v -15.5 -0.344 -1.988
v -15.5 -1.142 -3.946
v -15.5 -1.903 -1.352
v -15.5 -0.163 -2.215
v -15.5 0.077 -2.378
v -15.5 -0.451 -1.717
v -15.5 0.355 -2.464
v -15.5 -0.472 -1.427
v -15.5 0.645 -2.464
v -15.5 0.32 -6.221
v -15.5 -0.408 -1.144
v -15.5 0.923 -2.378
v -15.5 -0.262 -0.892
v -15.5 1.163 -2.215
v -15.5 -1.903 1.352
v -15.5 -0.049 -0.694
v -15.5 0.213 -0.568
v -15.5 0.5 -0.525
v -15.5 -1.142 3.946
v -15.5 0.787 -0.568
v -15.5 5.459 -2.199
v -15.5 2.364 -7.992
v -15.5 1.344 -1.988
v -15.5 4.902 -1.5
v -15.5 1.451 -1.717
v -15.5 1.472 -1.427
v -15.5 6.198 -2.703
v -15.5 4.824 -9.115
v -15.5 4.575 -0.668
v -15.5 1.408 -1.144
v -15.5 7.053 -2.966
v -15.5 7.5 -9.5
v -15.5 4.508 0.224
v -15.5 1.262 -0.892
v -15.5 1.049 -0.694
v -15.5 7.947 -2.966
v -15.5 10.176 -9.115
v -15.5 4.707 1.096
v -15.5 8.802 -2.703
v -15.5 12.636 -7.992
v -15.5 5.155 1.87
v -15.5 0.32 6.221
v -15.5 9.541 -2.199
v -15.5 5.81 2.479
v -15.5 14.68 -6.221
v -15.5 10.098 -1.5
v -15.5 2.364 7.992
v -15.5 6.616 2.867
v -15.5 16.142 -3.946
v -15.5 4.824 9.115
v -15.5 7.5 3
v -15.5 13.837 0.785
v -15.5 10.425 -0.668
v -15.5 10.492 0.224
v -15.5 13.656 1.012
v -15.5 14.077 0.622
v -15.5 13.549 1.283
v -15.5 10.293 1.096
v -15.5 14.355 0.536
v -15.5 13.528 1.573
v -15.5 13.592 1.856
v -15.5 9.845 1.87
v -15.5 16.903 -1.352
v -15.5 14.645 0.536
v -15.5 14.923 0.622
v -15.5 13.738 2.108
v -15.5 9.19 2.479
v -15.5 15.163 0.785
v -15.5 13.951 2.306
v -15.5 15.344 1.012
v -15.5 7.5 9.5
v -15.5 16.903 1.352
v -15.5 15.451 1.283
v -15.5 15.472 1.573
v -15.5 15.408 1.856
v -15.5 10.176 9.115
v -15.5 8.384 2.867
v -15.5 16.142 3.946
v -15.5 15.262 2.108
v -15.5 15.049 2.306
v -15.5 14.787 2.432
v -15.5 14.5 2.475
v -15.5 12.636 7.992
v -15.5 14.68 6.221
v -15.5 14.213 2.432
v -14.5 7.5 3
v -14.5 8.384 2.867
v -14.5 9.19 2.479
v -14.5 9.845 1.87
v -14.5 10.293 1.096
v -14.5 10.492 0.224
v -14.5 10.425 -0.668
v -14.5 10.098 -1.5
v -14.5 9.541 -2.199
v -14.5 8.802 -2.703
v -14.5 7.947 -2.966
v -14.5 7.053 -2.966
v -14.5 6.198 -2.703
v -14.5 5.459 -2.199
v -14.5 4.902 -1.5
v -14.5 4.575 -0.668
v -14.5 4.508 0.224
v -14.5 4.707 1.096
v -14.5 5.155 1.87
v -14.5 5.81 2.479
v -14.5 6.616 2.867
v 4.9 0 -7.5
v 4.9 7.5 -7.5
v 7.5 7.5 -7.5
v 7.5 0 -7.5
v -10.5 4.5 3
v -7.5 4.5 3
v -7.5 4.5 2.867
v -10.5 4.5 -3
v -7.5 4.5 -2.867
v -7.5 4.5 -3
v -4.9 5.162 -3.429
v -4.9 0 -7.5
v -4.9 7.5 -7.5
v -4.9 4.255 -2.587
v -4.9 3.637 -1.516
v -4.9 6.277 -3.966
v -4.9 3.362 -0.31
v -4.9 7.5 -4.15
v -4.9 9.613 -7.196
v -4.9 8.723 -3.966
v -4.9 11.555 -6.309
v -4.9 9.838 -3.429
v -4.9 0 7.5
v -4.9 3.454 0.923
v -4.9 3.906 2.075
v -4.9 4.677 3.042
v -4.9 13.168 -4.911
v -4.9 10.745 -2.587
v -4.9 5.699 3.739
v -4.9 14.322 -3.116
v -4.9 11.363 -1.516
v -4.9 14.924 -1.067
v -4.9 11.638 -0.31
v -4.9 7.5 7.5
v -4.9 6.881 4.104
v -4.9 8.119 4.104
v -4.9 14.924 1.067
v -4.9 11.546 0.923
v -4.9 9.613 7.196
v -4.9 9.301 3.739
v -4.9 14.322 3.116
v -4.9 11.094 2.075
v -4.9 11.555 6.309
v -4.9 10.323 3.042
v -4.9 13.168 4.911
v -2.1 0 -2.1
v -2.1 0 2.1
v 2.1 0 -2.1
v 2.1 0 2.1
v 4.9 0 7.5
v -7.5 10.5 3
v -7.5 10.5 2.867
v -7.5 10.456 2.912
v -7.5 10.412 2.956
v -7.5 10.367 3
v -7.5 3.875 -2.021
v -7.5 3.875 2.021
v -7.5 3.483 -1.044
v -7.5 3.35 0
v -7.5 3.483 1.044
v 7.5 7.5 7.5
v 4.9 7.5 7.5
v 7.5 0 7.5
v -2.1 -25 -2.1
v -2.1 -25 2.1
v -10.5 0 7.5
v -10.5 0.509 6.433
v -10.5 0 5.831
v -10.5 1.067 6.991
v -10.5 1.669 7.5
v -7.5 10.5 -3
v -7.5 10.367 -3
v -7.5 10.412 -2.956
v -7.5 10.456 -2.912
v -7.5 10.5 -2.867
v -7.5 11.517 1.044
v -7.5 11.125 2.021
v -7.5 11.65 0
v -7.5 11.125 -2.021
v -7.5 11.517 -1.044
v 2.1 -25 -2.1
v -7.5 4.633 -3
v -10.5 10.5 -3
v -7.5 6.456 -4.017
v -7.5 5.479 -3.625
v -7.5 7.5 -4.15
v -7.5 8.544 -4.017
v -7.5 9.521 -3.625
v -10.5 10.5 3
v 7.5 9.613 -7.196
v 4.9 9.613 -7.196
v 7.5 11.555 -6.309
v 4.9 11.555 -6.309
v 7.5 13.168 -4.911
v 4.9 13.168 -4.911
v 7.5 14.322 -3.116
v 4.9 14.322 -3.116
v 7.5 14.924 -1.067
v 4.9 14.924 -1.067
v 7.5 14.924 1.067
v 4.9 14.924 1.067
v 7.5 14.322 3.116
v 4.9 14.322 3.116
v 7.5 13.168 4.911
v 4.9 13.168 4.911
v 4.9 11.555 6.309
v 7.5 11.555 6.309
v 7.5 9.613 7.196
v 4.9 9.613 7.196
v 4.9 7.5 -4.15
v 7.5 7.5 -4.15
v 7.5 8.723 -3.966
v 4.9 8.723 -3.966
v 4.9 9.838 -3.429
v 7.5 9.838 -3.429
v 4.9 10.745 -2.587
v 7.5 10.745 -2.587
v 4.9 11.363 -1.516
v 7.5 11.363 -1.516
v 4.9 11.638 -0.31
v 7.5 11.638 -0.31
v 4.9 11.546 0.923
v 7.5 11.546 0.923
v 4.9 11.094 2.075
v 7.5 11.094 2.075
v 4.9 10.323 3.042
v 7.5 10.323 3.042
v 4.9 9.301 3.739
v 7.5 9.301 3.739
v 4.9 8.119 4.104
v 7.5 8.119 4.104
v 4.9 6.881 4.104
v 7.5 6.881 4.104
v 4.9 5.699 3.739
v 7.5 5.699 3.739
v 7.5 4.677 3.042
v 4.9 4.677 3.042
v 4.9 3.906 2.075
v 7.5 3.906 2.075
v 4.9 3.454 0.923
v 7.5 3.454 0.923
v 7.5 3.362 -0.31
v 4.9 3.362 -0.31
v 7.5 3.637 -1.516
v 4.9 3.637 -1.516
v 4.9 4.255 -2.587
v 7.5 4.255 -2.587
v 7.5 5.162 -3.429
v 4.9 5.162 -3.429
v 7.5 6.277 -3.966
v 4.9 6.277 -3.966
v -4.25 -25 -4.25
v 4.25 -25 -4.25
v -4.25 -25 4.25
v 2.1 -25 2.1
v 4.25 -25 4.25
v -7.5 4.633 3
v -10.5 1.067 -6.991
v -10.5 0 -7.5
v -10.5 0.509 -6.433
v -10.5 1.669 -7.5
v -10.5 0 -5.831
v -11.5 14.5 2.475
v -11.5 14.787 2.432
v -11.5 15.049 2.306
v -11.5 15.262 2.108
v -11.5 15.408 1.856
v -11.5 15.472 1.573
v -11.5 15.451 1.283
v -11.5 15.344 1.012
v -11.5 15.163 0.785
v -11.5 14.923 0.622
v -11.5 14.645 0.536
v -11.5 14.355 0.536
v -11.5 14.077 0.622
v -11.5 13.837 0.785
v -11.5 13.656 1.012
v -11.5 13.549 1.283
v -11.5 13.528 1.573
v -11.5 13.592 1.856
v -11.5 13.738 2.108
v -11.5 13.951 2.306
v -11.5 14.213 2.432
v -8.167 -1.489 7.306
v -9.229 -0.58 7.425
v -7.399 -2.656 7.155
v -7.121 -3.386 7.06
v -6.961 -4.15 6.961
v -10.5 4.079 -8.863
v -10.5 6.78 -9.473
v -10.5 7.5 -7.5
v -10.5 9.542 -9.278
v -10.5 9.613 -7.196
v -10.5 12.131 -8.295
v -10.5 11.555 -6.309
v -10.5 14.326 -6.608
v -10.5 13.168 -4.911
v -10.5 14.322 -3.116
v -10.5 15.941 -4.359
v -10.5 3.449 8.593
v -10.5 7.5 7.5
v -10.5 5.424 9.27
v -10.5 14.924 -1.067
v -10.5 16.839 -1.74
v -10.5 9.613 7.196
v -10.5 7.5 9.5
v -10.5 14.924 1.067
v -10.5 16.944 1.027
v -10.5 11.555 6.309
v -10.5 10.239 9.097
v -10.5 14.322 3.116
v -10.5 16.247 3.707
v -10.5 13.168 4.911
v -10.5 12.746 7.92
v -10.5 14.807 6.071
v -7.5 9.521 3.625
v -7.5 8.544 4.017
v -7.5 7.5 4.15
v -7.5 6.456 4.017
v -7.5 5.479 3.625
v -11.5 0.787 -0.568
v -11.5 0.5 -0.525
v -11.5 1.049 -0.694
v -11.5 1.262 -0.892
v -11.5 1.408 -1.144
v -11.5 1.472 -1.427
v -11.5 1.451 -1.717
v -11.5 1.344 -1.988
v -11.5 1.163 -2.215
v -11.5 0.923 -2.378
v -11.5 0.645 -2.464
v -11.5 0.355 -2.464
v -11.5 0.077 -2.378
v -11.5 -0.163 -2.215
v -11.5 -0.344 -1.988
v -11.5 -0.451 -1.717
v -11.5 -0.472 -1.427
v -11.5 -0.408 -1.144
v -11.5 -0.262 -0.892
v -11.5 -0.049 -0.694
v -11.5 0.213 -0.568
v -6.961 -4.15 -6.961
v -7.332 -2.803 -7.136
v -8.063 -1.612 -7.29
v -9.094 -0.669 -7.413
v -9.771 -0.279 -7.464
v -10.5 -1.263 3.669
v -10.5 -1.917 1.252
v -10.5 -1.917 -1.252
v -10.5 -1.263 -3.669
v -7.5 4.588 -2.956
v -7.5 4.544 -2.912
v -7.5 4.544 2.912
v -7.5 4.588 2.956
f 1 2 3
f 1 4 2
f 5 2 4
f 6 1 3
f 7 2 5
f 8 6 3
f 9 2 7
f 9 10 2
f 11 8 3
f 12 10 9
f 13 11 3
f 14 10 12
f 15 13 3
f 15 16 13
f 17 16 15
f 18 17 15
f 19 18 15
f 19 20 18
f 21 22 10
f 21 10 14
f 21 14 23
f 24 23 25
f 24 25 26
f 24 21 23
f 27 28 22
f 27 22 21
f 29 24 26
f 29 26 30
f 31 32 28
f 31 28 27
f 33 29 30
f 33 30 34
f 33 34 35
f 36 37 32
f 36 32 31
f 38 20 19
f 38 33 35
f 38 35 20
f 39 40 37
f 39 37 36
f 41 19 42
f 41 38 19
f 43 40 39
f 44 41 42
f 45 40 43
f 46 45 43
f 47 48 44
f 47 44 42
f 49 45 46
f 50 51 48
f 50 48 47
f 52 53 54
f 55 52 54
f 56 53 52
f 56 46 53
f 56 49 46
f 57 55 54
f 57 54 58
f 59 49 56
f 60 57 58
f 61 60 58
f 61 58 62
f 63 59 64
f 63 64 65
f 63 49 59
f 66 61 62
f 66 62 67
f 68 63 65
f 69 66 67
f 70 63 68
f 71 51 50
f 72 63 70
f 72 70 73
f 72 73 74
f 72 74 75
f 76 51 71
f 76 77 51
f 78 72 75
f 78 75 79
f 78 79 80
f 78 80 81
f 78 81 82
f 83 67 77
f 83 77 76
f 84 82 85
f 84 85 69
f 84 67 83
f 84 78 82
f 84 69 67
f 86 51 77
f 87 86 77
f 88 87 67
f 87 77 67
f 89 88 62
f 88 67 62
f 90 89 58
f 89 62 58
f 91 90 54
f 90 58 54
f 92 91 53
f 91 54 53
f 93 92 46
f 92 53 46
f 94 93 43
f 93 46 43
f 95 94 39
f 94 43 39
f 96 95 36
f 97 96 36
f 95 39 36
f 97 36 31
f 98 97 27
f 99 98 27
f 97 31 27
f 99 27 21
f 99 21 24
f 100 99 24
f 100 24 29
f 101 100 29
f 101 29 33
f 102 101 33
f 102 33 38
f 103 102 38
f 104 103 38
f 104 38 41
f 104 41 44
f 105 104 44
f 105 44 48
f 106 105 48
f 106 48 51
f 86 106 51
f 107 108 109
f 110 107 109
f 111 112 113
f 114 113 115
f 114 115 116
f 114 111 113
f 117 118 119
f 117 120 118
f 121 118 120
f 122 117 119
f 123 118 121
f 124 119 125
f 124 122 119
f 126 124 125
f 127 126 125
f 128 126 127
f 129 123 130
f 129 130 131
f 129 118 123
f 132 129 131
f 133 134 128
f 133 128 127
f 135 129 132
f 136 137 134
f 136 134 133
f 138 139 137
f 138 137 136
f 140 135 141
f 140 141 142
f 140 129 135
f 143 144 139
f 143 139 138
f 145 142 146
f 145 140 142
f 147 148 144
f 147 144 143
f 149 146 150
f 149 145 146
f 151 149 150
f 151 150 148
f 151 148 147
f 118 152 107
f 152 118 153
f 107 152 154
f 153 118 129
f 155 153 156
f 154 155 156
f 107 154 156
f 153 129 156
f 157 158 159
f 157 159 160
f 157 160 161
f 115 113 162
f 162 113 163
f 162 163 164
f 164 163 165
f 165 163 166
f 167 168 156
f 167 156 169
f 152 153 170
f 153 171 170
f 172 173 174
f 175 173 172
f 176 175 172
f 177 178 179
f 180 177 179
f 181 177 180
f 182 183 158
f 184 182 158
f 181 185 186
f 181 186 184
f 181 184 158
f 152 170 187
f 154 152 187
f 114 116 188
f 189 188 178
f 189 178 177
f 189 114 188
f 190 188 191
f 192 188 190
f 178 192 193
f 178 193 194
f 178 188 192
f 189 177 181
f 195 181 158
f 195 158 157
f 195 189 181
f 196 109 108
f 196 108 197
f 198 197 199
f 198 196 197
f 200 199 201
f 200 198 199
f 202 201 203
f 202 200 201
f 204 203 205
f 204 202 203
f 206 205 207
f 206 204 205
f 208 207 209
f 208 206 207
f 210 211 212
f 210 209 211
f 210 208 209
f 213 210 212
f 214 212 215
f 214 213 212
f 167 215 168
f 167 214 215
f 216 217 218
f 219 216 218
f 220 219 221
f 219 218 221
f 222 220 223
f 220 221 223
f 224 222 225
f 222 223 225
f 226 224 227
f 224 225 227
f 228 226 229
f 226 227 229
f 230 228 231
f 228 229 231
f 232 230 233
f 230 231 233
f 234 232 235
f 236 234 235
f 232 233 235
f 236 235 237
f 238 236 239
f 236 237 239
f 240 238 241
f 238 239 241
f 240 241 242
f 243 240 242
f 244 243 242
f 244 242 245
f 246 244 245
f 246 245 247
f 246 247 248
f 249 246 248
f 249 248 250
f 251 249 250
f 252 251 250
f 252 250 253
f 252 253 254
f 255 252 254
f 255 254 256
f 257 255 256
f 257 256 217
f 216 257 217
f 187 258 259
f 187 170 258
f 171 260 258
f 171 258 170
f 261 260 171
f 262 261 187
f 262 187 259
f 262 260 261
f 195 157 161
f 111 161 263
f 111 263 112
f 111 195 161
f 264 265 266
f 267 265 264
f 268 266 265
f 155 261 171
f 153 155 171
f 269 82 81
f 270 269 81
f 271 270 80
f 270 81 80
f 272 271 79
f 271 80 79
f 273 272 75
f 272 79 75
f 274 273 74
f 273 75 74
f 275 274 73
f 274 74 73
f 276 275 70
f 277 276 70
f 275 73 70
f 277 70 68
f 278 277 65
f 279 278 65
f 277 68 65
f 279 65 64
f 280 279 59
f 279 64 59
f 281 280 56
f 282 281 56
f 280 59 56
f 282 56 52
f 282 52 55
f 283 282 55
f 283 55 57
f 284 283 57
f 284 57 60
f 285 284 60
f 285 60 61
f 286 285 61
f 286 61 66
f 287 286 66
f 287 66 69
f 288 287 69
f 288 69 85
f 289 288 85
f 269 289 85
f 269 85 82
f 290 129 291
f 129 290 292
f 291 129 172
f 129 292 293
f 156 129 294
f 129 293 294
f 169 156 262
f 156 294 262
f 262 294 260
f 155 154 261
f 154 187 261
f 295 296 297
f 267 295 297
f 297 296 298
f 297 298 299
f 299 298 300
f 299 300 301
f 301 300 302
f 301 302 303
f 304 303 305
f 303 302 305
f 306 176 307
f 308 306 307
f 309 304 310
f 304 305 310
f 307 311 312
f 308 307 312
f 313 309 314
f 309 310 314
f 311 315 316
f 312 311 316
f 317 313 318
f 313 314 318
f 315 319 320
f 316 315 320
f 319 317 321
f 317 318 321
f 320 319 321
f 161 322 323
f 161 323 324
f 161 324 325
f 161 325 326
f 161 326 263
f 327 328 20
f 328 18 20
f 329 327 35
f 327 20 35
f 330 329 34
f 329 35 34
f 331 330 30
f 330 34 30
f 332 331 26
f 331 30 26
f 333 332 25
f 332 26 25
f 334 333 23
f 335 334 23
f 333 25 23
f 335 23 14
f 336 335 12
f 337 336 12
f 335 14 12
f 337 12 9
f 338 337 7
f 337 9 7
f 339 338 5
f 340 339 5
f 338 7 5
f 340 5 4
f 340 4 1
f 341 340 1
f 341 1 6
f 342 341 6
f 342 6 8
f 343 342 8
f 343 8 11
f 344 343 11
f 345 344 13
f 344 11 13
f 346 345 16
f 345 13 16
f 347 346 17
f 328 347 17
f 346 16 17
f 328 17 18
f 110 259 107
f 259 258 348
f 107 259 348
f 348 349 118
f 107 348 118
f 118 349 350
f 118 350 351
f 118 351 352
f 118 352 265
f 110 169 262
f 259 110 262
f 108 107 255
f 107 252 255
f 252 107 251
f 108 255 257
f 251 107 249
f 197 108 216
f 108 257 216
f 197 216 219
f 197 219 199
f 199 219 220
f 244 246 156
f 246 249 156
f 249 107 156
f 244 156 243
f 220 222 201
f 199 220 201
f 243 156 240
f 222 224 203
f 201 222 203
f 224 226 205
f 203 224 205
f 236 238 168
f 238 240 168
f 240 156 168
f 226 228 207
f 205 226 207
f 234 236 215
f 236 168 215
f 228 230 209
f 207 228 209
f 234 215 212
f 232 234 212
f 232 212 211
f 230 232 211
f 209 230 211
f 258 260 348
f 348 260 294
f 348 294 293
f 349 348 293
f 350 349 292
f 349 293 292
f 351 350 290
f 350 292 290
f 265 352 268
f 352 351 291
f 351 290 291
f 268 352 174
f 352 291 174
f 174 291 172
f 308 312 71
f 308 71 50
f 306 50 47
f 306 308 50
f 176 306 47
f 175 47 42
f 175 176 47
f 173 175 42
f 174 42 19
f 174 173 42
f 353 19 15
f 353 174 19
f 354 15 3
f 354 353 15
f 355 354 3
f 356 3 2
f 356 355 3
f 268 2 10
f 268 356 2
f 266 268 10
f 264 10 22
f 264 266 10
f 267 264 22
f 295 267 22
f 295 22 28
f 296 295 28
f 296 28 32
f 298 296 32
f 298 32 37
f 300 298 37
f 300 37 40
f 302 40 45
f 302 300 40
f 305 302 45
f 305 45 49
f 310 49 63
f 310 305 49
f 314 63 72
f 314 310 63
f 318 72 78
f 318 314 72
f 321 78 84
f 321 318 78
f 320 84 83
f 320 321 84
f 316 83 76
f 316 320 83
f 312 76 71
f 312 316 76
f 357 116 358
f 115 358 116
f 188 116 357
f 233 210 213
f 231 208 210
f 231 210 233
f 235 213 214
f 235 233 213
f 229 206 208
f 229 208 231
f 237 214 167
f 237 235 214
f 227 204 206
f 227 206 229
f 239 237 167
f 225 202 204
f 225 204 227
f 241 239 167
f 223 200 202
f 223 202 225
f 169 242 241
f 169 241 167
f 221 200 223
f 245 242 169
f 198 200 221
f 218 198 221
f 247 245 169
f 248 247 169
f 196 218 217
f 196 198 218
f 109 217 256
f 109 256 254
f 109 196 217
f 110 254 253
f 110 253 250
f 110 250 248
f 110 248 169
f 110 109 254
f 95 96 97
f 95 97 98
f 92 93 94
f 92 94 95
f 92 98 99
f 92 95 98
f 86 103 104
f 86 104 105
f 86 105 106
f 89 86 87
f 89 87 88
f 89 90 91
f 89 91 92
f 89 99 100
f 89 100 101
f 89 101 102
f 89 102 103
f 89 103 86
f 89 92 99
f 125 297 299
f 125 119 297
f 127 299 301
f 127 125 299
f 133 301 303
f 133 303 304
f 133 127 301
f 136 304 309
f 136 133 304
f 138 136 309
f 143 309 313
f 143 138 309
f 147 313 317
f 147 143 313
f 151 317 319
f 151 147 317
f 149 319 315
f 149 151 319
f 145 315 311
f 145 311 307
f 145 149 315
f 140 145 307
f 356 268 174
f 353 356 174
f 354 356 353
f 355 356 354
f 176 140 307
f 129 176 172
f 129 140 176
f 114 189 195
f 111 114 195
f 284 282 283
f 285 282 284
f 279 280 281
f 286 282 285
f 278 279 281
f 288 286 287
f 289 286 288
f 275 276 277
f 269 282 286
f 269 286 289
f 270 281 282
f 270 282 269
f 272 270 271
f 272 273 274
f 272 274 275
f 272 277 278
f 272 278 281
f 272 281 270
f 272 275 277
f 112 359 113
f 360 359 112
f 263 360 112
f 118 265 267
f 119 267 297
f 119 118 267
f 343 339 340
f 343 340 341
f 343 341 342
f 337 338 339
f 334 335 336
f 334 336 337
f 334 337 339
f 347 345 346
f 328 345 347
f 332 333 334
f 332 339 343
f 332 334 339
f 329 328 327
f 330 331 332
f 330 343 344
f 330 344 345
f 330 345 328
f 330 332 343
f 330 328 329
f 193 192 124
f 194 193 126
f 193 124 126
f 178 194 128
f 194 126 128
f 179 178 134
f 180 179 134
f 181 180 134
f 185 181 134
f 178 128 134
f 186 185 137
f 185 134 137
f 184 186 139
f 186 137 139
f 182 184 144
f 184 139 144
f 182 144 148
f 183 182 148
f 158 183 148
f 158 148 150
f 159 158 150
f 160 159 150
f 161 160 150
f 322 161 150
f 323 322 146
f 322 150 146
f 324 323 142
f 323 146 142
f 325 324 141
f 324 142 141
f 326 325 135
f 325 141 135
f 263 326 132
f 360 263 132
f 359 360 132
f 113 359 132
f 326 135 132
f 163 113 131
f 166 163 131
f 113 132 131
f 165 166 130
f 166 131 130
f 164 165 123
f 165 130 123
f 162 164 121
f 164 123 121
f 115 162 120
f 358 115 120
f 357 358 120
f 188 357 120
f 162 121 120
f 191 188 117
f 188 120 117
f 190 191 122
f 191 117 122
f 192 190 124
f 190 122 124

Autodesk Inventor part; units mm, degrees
ref_plane "YZ Plane" through (0, 0, 0) normal (1, 0, 0) x (0, 1, 0)
ref_plane "XZ Plane" through (0, 0, 0) normal (0, 1, 0) x (-1, 0, 0)
ref_plane "XY Plane" through (0, 0, 0) normal (0, 0, 1) x (1, 0, 0)
sketch "Sketch1" plane through (0, 0, 0) normal (0, 0, 1) x (1, 0, 0)
  line L0 (0, 0) -> (-7.5, 0)
  line L1 (-7.5, 0) -> (-7.5, 15)
  line L2 (-7.5, 15) -> (7.5, 15)
  line L3 (7.5, 15) -> (7.5, 0)
  line L4 (7.5, 0) -> (-7.5, 0)
  dimension "d55" = 7.5
  dimension "d56" = 15
  dimension "d57" = 15
extrude "Extrusion1" add sketch "Sketch1" along normal mid plane 15
sketch "Sketch11" plane through (0, 0, 7.5) normal (0, 0, 1) x (1, 0, 0)
  line L0 (7.5, 15) -> (-7.5, 15) projected
  line L1 (0, 15) -> (0, -25)
  line L2 (0, -25) -> (4.25, -25)
  line L3 (0, -25) -> (-4.25, -25)
  line L4 (-7.5, 0) -> (7.5, 0) projected
  line L5 (-4.25, -25) -> (-7.5, 0)
  line L6 (-7.5, 0) -> (7.5, 0)
  line L7 (7.5, 0) -> (4.25, -25)
  point P0 (0, 0)
  dimension "d58" = 40
  dimension "d59" = 4.25
  dimension "d60" = 4.25
extrude "Extrusion7" add sketch "Sketch11" against normal blind 15
sketch "Sketch13" plane through (0, 0, 0) normal (1, 0, 0) x (0, 1, 0)
  line L0 (15, -7.5) -> (15, 7.5) projected
  line L1 (15, 0) -> (-25, 0)
  line L2 (-25, 7.5) -> (-25, -7.5) projected
  line L3 (-25, 0) -> (-25, 4.25)
  line L4 (-25, 7.5) -> (-25, -7.5) projected
  line L5 (-25, 4.25) -> (-25, 0)
  line L6 (-25, 0) -> (-25, -4.25)
  line L7 (0, -7.5) -> (15, -7.5) projected
  line L8 (-25, -4.25) -> (0, -7.5)
  line L9 (0, -7.5) -> (0, 7.5)
  line L10 (0, 7.5) -> (-25, 4.25)
  line L11 (-25, 4.25) -> (-25, 7.5)
  line L12 (-25, 7.5) -> (0, 7.5)
  line L13 (-25, -4.25) -> (-25, -7.5)
  line L14 (-25, -7.5) -> (0, -7.5) projected
  line L15 (-25, -7.5) -> (0, -7.5)
  point P0 (0, 0)
  dimension "d68" = 40
  dimension "d69" = 4.25
  dimension "d70" = 4.25
extrude "Extrusion8" cut sketch "Sketch13" along normal through all both and the other way through all contours L14 L2 L8 | L10 L2 L12
sketch "Sketch15" plane through (-4.25, -25, -4.25) normal (0, -1, 0) x (1, 0, 0)
  line L0 (4.25, 4.25) -> (2.15, 4.25)
  line L1 (0, 8.5) -> (0, 0) projected
  line L2 (2.15, 4.25) -> (2.15, 2.15)
  line L3 (2.15, 2.15) -> (6.35, 2.15)
  line L4 (6.35, 2.15) -> (6.35, 6.35)
  line L5 (6.35, 6.35) -> (2.15, 6.35)
  line L6 (2.15, 6.35) -> (2.15, 4.25)
  point P0 (8.5, 8.5)
  point P1 (8.5, 0)
  dimension "d112" = 2.1
  dimension "d113" = 2.1
  dimension "d114" = 4.2
  dimension "d115" = 4.2
extrude "Extrusion9" cut sketch "Sketch15" against normal through all
sketch "Sketch16" plane through (0, 0, 7.5) normal (0, 0, 1) x (1, 0, 0)
  line L0 (0, 0) -> (4.9, 0)
  line L1 (-7.5, 0) -> (7.5, 0) projected
  line L2 (4.9, 0) -> (4.9, 16.5506)
  line L3 (0, 0) -> (-4.9, 0)
  line L4 (-4.9, 0) -> (-4.9, 16.5506)
  line L5 (-4.9, 16.5506) -> (4.9, 16.5506)
  dimension "d83" = 4.9
  dimension "d84" = 4.9
extrude "Extrusion10" cut sketch "Sketch16" against normal through all
sketch "Sketch17" plane through (7.5, 15, 7.5) normal (1, 0, 0) x (0, 0, -1)
  line L0 (15, 0) -> (0, 0) projected
  line L1 (0, 0) -> (7.5, 0)
  line L2 (0, 0) -> (0, -15) projected
  line L3 (0, -7.5) -> (0, 0)
  line L4 (0, 0) -> (15, 0)
  line L5 (15, -15) -> (15, 0) projected
  line L6 (15, 0) -> (15, -7.5)
  arc A0 (15, -7.5) -> (0, -7.5) centre (7.5, -7.5) ccw
  line L7 (0, -15) -> (0, 0) projected
  line L8 (0, -7.5) -> (0, 0)
  line L9 (15, 0) -> (0, 0) projected
  line L10 (0, 0) -> (15, 0)
  line L11 (15, 0) -> (15, -7.5)
  point P0 (7.5, -15)
  dimension "d133" = 15
extrude "Extrusion11" cut sketch "Sketch17" against normal through all
sketch "Sketch18" plane through (7.5, 0, 7.5) normal (1, 0, 0) x (0, 0, -1)
  line L0 (0, 0) -> (0, 15)
  line L1 (0, 15) -> (15, 15)
  line L2 (15, 15) -> (15, 0)
  line L3 (15, 0) -> (0, 0)
  line L4 (0, 15) -> (15, 0)
  line L5 (15, 15) -> (0, 0)
  circle A0 centre (7.5, 7.5) radius 4.15
  point P0 (7.5, 0)
  dimension "d90" = 15
  dimension "d91" = 8.3
extrude "Extrusion12" cut sketch "Sketch18" against normal blind 8.3 contours A0 L4 L5 | L5 L4 A0 | A0 L5 L4 | L4 L5 A0
sketch "Sketch19" plane through (-7.5, 0, -7.5) normal (-1, 0, 0) x (0, 0, 1)
  line L0 (0, 0) -> (0, 15)
  line L1 (0, 15) -> (15, 15)
  line L2 (15, 15) -> (15, 0)
  line L3 (15, 0) -> (0, 0) projected
  line L4 (15, 0) -> (0, 0)
  point P0 (7.5, 0)
  dimension "d94" = 15
extrude "Extrusion13" add sketch "Sketch19" along normal blind 3
sketch "Sketch20" plane through (-4.9, 0, 7.5) normal (1, 0, 0) x (0, 0, -1)
  line L0 (0, 0) -> (0, 15) projected
  line L1 (0, 0) -> (0, 15)
  line L2 (0, 15) -> (15, 15)
  line L3 (15, 0) -> (0, 0) projected
  line L4 (15, 15) -> (15, 0)
  line L5 (15, 0) -> (0, 0)
  line L6 (0, 0) -> (15, 15)
  line L7 (0, 15) -> (15, 0)
  circle A0 centre (7.5, 7.5) radius 4.15
  point P0 (7.5, 0)
  dimension "d97" = 15
  dimension "d98" = 8.3
extrude "Extrusion14" cut sketch "Sketch20" against normal blind 2.6 contours A0 L7 L6 | L6 L7 A0 | A0 L6 L7 | L7 L6 A0
sketch "Sketch21" plane through (-10.5, 0, -7.5) normal (-1, 0, 0) x (0, 0, 1)
  line L0 (0, 15) -> (0, 0) projected
  line L1 (15, 0) -> (15, 15) projected
  line L2 (0, 0) -> (15, 15)
  line L3 (0, 15) -> (0, 0) projected
  line L4 (15, 15) -> (0, 15)
  line L5 (0, 15) -> (15, 0)
  line L6 (7.5, 7.5) -> (7.5, 10.5)
  line L7 (7.5, 10.5) -> (10.5, 10.5)
  line L8 (10.5, 10.5) -> (10.5, 4.5)
  line L9 (10.5, 4.5) -> (4.5, 4.5)
  line L10 (4.5, 4.5) -> (4.5, 10.5)
  line L11 (4.5, 10.5) -> (10.5, 10.5)
  point P0 (7.5, 0)
  point P1 (0, 7.5)
  dimension "d101" = 3
  dimension "d102" = 3
  dimension "d103" = 6
  dimension "d104" = 6
extrude "Extrusion15" cut sketch "Sketch21" against normal blind 3 contours L11 L6 L5 | L5 L2 L10 | L2 L5 L9 | L8 L5 L2 | L2 L6 L7
sketch "Sketch23" plane through (-4.9, 0, 7.5) normal (1, 0, 0) x (0, 0, -1)
  line L0 (0, 0) -> (0, 15) projected
  line L1 (0, 0) -> (0, 15)
  line L2 (0, 15) -> (15, 15)
  line L3 (15, 15) -> (15, 0)
  line L4 (15, 0) -> (0, 0)
  line L5 (0, 15) -> (7.5, 15)
  arc A0 (15, 7.5) -> (0, 7.5) centre (7.5, 7.5) ccw
  line L6 (0, 7.5) -> (0, 15)
  line L7 (15, 15) -> (15, 7.5)
  point P0 (7.5, 0)
  point P1 (0, 7.5)
  dimension "d107" = 15
extrude "Extrusion16" cut sketch "Sketch23" against normal through all contours L0 L2 A0 | L2 L3 A0
fillet "Fillet2" radius 5 1 edges at (-7.5, 0, 0)
sketch "Sketch24" plane through (-10.5, 0, -7.5) normal (-1, 0, 0) x (0, 0, 1)
  line L0 (3.25, -25) -> (0, 0) projected
  line L1 (0, 0) -> (7.5, 0)
  line L2 (0, 0) -> (15, 0) projected
  line L3 (7.5, 0) -> (7.5, 4.5)
  line L4 (10.5, 4.5) -> (4.5, 4.5) projected
  line L5 (7.5, 4.5) -> (7.5, 7.5)
  circle A0 centre (7.5, 7.5) radius 9.5
  line L6 (1.669, 0) -> (13.331, 0)
  point P0 (13.331, 0)
  point P1 (1.669, 0)
  dimension "d116" = 3
  dimension "d117" = 19
extrude "Extrusion17" add sketch "Sketch24" along normal blind 5
sketch "Sketch25" plane through (-15.5, 0, -7.5) normal (-1, 0, 0) x (0, 0, 1)
  line L0 (0, 0) -> (1.669, 0) projected
  line L1 (0, 0) -> (7.5, 0)
  arc A0 (15, 1.669) -> (0, 1.669) centre (7.5, 7.5) ccw projected
  line L2 (7.5, 0) -> (7.5, 7.5)
  line L3 (7.5, 7.5) -> (7.5, 14.5)
  line L4 (7.5, 14.5) -> (9, 14.5)
  circle A1 centre (9, 14.5) radius 0.975
  line L5 (7.5, 7.5) -> (7.5, 0.5)
  line L6 (7.5, 0.5) -> (6, 0.5)
  line L7 (0, 0) -> (15, 0) projected
  circle A2 centre (6, 0.5) radius 0.975
  point P0 (13.331, 0)
  dimension "d120" = 7
  dimension "d121" = 1.5
  dimension "d122" = 1.95
  dimension "d123" = 7
  dimension "d124" = 1.5
  dimension "d125" = 90
  dimension "d126" = 1.95
extrude "Extrusion18" cut sketch "Sketch25" against normal blind 4 contours A2 L1 | L1 A2 | A1
sketch "Sketch26" plane through (-15.5, 7.5, 0) normal (-1, 0, 0) x (0, 0, 1)
  circle A0 centre (0, 0) radius 3
  point P0 (0, -7.5)
  dimension "d129" = 6
extrude "Extrusion19" cut sketch "Sketch26" against normal blind 1
equation "\"d92\" = d91"
equation "\"d105\" = d101"
properties part number "Hip joint 4 med servofeste"
